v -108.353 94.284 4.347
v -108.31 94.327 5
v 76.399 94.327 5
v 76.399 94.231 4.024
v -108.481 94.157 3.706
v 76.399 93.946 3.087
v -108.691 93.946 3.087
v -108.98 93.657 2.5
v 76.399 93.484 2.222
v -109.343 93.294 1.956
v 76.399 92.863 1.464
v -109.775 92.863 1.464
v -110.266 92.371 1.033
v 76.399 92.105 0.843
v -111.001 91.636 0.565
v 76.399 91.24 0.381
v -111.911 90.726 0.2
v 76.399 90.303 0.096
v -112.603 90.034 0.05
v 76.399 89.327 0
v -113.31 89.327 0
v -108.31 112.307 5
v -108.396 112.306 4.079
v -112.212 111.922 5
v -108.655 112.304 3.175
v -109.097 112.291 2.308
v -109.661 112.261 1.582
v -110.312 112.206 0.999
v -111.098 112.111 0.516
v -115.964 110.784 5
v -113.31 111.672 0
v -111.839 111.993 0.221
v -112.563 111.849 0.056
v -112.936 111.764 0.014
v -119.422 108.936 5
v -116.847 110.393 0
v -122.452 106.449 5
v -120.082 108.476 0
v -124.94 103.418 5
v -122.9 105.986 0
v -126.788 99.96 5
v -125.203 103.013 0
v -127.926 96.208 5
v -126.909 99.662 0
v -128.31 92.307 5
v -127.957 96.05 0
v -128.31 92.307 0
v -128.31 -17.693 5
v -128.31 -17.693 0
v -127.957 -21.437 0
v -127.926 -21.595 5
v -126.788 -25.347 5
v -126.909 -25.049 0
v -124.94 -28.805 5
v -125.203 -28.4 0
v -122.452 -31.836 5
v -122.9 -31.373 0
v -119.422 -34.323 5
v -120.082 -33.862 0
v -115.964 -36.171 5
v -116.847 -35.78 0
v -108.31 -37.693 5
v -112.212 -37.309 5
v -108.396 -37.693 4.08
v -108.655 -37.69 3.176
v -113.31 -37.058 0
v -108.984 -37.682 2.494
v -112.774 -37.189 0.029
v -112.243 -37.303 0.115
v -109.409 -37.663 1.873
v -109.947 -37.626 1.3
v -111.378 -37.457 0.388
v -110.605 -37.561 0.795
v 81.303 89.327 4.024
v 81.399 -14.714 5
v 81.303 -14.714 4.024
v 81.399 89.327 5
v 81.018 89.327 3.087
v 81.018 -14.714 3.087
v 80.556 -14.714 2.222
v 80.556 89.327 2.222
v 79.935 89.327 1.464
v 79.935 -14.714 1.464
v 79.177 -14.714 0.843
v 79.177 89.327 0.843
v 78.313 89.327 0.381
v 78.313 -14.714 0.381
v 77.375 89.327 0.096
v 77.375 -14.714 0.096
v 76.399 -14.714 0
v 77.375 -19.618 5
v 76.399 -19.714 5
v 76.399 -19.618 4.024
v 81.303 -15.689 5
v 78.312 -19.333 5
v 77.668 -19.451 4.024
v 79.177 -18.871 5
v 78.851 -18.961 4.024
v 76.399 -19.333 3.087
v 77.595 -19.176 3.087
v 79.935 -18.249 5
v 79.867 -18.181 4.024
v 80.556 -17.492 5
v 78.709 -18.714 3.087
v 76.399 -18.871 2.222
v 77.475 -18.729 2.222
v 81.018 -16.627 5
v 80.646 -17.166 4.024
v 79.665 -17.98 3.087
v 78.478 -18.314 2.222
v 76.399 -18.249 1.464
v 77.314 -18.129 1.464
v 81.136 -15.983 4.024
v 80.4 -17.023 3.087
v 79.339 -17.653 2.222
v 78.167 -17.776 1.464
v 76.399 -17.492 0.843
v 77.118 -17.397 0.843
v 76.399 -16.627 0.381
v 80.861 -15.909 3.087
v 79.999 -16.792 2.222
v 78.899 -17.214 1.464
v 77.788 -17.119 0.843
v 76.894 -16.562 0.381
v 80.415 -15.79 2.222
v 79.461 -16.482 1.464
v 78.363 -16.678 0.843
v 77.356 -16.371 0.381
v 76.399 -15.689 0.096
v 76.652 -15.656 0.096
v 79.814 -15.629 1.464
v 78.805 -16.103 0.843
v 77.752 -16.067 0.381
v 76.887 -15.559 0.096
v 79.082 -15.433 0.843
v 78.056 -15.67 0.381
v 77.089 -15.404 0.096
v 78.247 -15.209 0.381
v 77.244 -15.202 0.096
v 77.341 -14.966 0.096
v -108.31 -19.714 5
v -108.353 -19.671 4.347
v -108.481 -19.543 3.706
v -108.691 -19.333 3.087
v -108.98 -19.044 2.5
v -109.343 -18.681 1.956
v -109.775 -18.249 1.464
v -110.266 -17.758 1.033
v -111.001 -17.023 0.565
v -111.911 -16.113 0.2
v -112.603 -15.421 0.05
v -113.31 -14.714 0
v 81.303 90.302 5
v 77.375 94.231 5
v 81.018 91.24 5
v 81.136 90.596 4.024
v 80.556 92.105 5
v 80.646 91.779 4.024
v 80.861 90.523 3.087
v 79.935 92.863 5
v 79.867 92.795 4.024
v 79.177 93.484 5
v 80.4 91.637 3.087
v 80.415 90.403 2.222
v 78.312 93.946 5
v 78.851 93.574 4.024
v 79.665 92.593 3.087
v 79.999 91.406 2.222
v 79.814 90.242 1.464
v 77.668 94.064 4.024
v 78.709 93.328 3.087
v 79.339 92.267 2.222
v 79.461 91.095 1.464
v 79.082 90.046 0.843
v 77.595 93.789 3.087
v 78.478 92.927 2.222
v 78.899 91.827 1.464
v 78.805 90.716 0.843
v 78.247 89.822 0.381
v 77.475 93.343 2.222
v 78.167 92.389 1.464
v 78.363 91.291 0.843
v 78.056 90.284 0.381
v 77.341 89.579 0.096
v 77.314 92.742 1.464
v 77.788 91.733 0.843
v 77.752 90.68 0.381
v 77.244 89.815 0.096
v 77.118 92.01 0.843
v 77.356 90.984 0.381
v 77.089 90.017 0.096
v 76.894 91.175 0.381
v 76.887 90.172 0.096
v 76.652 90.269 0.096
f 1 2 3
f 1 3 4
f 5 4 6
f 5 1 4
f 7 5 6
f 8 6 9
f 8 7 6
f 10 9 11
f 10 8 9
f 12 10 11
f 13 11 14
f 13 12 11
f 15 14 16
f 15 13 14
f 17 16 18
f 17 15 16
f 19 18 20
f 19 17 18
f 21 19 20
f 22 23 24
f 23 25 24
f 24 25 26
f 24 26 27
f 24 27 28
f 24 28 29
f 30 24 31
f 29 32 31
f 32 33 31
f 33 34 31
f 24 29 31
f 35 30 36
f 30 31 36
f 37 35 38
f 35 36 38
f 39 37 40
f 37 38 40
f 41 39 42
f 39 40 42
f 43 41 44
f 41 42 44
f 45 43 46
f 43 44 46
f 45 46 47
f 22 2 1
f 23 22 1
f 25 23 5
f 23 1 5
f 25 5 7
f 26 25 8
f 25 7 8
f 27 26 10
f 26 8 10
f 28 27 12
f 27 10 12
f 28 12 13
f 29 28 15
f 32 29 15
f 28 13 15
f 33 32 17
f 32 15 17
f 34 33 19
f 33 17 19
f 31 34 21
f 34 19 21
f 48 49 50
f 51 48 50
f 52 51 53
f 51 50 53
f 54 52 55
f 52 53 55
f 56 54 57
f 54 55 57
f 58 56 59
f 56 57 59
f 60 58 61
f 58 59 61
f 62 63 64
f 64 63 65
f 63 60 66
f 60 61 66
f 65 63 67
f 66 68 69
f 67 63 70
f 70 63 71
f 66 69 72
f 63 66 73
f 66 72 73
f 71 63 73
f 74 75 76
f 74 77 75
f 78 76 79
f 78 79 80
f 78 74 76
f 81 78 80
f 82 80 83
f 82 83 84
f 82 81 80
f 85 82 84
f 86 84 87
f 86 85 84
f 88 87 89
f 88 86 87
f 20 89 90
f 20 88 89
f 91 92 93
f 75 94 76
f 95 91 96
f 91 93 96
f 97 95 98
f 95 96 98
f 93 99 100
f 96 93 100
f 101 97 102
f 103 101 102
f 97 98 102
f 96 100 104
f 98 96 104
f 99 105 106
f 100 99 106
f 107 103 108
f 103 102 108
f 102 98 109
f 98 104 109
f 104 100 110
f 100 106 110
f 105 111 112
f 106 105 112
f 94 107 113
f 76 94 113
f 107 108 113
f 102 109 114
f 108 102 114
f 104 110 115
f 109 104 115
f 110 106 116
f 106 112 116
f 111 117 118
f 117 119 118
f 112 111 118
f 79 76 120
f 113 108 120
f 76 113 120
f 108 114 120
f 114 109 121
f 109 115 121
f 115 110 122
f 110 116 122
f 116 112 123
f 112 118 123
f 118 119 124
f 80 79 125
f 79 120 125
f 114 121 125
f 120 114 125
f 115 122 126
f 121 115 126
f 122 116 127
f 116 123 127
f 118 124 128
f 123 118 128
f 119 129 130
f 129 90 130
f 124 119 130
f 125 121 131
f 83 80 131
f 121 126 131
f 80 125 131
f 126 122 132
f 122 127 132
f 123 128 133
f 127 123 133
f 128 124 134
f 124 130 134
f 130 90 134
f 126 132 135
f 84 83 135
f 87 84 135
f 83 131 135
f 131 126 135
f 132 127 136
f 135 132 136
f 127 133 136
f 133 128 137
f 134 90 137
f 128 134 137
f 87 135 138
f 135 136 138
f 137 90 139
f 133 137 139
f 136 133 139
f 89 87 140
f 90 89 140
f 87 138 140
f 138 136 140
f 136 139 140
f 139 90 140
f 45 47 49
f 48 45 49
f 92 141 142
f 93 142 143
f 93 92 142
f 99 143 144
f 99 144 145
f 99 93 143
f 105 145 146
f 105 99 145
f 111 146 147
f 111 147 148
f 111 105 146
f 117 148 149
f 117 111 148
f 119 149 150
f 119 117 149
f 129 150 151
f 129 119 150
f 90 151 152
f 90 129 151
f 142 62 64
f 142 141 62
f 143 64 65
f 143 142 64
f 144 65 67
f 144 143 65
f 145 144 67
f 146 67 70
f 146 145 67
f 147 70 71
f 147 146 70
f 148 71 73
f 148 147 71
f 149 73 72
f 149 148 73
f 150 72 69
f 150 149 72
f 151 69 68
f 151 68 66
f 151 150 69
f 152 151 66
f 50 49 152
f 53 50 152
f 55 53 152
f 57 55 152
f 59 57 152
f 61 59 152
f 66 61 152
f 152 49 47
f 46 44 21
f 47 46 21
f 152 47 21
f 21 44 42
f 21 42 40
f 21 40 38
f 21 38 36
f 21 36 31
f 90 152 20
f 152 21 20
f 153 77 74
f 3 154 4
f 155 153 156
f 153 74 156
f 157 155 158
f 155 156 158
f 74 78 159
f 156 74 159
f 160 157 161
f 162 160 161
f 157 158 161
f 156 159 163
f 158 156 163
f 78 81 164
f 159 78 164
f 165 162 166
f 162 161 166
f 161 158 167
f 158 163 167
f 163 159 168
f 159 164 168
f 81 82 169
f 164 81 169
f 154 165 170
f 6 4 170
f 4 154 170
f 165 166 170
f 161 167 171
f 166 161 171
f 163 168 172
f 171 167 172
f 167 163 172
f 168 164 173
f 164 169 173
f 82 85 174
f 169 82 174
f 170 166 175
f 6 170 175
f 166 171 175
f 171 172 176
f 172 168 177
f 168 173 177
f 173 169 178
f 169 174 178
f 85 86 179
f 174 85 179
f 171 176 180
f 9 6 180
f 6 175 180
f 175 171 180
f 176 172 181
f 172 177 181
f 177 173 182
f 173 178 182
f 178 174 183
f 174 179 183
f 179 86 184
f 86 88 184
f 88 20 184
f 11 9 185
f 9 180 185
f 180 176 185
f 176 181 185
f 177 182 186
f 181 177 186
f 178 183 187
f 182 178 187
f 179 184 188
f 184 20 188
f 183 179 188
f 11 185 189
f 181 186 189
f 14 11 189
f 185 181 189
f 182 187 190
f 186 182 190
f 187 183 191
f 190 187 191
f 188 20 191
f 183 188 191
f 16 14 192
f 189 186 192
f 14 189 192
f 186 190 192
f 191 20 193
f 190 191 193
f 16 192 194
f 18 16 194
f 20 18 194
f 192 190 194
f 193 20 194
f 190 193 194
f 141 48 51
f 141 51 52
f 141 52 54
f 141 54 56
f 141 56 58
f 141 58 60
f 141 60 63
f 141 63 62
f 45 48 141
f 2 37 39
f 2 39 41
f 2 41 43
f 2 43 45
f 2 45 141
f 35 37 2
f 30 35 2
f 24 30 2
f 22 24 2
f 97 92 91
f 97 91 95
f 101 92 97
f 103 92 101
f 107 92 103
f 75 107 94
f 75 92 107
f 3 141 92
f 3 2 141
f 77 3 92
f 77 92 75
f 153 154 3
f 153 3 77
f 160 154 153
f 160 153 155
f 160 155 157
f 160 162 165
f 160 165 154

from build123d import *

# Parameters (mm, degrees)
BOSS_EXTRUDE1_DEPTH = 5
FILLET1_R           = 5
FILLET3_R           = 5
FILLET4_R           = 5


with BuildPart() as part:
    # Sketch1 → Boss-Extrude1 (new body)
    with BuildSketch(Plane.XY):
        with BuildLine():
            Line((-108.310248072, -37.693381192), (-108.310248072, -19.713755061))
            Line((-108.310248072, -19.713755061), (76.399052405, -19.713755061))
            ThreePointArc((76.399052405, -19.713755061), (79.934586311, -18.249288967), (81.399052405, -14.713755061))
            Line((81.399052405, -14.713755061), (81.399052405, 89.326992678))
            ThreePointArc((81.399052405, 89.326992678), (79.934586311, 92.862526584), (76.399052405, 94.326992678))
            Line((76.399052405, 94.326992678), (-108.310248072, 94.326992678))
            Line((-108.310248072, 94.326992678), (-108.310248072, 112.306618808))
            ThreePointArc((-108.310248072, 112.306618808), (-122.452383696, 106.448754432), (-128.310248072, 92.306618808))
            Line((-128.310248072, 92.306618808), (-128.310248072, -17.693381192))
            ThreePointArc((-128.310248072, -17.693381192), (-122.452383696, -31.835516815), (-108.310248072, -37.693381192))
        make_face()
    extrude(amount=BOSS_EXTRUDE1_DEPTH)

    # Fillet1
    fillet1_edges = [part.edges().sort_by_distance(p)[0] for p in [
        (-15.955597834, -19.713755061, 0),
        (79.934586311, -18.249288967, 0),
        (81.399052405, 37.306618808, 0),
        (79.934586311, 92.862526584, 0),
        (-15.955597834, 94.326992678, 0),
    ]]
    fillet(fillet1_edges, radius=FILLET1_R - 0.0001)  # a hair under: the kernel refuses the full size

    # Fillet3
    fillet3_edges = [part.edges().sort_by_distance(p)[0] for p in [
        (-108.310248072, 100.816855743, 0),
    ]]
    fillet(fillet3_edges, radius=FILLET3_R - 0.0001)  # a hair under: the kernel refuses the full size

    # Fillet4
    fillet4_edges = [part.edges().sort_by_distance(p)[0] for p in [
        (-108.310248072, -26.203618126, 0),
    ]]
    fillet(fillet4_edges, radius=FILLET4_R - 0.0001)  # a hair under: the kernel refuses the full size


solid = part.part
